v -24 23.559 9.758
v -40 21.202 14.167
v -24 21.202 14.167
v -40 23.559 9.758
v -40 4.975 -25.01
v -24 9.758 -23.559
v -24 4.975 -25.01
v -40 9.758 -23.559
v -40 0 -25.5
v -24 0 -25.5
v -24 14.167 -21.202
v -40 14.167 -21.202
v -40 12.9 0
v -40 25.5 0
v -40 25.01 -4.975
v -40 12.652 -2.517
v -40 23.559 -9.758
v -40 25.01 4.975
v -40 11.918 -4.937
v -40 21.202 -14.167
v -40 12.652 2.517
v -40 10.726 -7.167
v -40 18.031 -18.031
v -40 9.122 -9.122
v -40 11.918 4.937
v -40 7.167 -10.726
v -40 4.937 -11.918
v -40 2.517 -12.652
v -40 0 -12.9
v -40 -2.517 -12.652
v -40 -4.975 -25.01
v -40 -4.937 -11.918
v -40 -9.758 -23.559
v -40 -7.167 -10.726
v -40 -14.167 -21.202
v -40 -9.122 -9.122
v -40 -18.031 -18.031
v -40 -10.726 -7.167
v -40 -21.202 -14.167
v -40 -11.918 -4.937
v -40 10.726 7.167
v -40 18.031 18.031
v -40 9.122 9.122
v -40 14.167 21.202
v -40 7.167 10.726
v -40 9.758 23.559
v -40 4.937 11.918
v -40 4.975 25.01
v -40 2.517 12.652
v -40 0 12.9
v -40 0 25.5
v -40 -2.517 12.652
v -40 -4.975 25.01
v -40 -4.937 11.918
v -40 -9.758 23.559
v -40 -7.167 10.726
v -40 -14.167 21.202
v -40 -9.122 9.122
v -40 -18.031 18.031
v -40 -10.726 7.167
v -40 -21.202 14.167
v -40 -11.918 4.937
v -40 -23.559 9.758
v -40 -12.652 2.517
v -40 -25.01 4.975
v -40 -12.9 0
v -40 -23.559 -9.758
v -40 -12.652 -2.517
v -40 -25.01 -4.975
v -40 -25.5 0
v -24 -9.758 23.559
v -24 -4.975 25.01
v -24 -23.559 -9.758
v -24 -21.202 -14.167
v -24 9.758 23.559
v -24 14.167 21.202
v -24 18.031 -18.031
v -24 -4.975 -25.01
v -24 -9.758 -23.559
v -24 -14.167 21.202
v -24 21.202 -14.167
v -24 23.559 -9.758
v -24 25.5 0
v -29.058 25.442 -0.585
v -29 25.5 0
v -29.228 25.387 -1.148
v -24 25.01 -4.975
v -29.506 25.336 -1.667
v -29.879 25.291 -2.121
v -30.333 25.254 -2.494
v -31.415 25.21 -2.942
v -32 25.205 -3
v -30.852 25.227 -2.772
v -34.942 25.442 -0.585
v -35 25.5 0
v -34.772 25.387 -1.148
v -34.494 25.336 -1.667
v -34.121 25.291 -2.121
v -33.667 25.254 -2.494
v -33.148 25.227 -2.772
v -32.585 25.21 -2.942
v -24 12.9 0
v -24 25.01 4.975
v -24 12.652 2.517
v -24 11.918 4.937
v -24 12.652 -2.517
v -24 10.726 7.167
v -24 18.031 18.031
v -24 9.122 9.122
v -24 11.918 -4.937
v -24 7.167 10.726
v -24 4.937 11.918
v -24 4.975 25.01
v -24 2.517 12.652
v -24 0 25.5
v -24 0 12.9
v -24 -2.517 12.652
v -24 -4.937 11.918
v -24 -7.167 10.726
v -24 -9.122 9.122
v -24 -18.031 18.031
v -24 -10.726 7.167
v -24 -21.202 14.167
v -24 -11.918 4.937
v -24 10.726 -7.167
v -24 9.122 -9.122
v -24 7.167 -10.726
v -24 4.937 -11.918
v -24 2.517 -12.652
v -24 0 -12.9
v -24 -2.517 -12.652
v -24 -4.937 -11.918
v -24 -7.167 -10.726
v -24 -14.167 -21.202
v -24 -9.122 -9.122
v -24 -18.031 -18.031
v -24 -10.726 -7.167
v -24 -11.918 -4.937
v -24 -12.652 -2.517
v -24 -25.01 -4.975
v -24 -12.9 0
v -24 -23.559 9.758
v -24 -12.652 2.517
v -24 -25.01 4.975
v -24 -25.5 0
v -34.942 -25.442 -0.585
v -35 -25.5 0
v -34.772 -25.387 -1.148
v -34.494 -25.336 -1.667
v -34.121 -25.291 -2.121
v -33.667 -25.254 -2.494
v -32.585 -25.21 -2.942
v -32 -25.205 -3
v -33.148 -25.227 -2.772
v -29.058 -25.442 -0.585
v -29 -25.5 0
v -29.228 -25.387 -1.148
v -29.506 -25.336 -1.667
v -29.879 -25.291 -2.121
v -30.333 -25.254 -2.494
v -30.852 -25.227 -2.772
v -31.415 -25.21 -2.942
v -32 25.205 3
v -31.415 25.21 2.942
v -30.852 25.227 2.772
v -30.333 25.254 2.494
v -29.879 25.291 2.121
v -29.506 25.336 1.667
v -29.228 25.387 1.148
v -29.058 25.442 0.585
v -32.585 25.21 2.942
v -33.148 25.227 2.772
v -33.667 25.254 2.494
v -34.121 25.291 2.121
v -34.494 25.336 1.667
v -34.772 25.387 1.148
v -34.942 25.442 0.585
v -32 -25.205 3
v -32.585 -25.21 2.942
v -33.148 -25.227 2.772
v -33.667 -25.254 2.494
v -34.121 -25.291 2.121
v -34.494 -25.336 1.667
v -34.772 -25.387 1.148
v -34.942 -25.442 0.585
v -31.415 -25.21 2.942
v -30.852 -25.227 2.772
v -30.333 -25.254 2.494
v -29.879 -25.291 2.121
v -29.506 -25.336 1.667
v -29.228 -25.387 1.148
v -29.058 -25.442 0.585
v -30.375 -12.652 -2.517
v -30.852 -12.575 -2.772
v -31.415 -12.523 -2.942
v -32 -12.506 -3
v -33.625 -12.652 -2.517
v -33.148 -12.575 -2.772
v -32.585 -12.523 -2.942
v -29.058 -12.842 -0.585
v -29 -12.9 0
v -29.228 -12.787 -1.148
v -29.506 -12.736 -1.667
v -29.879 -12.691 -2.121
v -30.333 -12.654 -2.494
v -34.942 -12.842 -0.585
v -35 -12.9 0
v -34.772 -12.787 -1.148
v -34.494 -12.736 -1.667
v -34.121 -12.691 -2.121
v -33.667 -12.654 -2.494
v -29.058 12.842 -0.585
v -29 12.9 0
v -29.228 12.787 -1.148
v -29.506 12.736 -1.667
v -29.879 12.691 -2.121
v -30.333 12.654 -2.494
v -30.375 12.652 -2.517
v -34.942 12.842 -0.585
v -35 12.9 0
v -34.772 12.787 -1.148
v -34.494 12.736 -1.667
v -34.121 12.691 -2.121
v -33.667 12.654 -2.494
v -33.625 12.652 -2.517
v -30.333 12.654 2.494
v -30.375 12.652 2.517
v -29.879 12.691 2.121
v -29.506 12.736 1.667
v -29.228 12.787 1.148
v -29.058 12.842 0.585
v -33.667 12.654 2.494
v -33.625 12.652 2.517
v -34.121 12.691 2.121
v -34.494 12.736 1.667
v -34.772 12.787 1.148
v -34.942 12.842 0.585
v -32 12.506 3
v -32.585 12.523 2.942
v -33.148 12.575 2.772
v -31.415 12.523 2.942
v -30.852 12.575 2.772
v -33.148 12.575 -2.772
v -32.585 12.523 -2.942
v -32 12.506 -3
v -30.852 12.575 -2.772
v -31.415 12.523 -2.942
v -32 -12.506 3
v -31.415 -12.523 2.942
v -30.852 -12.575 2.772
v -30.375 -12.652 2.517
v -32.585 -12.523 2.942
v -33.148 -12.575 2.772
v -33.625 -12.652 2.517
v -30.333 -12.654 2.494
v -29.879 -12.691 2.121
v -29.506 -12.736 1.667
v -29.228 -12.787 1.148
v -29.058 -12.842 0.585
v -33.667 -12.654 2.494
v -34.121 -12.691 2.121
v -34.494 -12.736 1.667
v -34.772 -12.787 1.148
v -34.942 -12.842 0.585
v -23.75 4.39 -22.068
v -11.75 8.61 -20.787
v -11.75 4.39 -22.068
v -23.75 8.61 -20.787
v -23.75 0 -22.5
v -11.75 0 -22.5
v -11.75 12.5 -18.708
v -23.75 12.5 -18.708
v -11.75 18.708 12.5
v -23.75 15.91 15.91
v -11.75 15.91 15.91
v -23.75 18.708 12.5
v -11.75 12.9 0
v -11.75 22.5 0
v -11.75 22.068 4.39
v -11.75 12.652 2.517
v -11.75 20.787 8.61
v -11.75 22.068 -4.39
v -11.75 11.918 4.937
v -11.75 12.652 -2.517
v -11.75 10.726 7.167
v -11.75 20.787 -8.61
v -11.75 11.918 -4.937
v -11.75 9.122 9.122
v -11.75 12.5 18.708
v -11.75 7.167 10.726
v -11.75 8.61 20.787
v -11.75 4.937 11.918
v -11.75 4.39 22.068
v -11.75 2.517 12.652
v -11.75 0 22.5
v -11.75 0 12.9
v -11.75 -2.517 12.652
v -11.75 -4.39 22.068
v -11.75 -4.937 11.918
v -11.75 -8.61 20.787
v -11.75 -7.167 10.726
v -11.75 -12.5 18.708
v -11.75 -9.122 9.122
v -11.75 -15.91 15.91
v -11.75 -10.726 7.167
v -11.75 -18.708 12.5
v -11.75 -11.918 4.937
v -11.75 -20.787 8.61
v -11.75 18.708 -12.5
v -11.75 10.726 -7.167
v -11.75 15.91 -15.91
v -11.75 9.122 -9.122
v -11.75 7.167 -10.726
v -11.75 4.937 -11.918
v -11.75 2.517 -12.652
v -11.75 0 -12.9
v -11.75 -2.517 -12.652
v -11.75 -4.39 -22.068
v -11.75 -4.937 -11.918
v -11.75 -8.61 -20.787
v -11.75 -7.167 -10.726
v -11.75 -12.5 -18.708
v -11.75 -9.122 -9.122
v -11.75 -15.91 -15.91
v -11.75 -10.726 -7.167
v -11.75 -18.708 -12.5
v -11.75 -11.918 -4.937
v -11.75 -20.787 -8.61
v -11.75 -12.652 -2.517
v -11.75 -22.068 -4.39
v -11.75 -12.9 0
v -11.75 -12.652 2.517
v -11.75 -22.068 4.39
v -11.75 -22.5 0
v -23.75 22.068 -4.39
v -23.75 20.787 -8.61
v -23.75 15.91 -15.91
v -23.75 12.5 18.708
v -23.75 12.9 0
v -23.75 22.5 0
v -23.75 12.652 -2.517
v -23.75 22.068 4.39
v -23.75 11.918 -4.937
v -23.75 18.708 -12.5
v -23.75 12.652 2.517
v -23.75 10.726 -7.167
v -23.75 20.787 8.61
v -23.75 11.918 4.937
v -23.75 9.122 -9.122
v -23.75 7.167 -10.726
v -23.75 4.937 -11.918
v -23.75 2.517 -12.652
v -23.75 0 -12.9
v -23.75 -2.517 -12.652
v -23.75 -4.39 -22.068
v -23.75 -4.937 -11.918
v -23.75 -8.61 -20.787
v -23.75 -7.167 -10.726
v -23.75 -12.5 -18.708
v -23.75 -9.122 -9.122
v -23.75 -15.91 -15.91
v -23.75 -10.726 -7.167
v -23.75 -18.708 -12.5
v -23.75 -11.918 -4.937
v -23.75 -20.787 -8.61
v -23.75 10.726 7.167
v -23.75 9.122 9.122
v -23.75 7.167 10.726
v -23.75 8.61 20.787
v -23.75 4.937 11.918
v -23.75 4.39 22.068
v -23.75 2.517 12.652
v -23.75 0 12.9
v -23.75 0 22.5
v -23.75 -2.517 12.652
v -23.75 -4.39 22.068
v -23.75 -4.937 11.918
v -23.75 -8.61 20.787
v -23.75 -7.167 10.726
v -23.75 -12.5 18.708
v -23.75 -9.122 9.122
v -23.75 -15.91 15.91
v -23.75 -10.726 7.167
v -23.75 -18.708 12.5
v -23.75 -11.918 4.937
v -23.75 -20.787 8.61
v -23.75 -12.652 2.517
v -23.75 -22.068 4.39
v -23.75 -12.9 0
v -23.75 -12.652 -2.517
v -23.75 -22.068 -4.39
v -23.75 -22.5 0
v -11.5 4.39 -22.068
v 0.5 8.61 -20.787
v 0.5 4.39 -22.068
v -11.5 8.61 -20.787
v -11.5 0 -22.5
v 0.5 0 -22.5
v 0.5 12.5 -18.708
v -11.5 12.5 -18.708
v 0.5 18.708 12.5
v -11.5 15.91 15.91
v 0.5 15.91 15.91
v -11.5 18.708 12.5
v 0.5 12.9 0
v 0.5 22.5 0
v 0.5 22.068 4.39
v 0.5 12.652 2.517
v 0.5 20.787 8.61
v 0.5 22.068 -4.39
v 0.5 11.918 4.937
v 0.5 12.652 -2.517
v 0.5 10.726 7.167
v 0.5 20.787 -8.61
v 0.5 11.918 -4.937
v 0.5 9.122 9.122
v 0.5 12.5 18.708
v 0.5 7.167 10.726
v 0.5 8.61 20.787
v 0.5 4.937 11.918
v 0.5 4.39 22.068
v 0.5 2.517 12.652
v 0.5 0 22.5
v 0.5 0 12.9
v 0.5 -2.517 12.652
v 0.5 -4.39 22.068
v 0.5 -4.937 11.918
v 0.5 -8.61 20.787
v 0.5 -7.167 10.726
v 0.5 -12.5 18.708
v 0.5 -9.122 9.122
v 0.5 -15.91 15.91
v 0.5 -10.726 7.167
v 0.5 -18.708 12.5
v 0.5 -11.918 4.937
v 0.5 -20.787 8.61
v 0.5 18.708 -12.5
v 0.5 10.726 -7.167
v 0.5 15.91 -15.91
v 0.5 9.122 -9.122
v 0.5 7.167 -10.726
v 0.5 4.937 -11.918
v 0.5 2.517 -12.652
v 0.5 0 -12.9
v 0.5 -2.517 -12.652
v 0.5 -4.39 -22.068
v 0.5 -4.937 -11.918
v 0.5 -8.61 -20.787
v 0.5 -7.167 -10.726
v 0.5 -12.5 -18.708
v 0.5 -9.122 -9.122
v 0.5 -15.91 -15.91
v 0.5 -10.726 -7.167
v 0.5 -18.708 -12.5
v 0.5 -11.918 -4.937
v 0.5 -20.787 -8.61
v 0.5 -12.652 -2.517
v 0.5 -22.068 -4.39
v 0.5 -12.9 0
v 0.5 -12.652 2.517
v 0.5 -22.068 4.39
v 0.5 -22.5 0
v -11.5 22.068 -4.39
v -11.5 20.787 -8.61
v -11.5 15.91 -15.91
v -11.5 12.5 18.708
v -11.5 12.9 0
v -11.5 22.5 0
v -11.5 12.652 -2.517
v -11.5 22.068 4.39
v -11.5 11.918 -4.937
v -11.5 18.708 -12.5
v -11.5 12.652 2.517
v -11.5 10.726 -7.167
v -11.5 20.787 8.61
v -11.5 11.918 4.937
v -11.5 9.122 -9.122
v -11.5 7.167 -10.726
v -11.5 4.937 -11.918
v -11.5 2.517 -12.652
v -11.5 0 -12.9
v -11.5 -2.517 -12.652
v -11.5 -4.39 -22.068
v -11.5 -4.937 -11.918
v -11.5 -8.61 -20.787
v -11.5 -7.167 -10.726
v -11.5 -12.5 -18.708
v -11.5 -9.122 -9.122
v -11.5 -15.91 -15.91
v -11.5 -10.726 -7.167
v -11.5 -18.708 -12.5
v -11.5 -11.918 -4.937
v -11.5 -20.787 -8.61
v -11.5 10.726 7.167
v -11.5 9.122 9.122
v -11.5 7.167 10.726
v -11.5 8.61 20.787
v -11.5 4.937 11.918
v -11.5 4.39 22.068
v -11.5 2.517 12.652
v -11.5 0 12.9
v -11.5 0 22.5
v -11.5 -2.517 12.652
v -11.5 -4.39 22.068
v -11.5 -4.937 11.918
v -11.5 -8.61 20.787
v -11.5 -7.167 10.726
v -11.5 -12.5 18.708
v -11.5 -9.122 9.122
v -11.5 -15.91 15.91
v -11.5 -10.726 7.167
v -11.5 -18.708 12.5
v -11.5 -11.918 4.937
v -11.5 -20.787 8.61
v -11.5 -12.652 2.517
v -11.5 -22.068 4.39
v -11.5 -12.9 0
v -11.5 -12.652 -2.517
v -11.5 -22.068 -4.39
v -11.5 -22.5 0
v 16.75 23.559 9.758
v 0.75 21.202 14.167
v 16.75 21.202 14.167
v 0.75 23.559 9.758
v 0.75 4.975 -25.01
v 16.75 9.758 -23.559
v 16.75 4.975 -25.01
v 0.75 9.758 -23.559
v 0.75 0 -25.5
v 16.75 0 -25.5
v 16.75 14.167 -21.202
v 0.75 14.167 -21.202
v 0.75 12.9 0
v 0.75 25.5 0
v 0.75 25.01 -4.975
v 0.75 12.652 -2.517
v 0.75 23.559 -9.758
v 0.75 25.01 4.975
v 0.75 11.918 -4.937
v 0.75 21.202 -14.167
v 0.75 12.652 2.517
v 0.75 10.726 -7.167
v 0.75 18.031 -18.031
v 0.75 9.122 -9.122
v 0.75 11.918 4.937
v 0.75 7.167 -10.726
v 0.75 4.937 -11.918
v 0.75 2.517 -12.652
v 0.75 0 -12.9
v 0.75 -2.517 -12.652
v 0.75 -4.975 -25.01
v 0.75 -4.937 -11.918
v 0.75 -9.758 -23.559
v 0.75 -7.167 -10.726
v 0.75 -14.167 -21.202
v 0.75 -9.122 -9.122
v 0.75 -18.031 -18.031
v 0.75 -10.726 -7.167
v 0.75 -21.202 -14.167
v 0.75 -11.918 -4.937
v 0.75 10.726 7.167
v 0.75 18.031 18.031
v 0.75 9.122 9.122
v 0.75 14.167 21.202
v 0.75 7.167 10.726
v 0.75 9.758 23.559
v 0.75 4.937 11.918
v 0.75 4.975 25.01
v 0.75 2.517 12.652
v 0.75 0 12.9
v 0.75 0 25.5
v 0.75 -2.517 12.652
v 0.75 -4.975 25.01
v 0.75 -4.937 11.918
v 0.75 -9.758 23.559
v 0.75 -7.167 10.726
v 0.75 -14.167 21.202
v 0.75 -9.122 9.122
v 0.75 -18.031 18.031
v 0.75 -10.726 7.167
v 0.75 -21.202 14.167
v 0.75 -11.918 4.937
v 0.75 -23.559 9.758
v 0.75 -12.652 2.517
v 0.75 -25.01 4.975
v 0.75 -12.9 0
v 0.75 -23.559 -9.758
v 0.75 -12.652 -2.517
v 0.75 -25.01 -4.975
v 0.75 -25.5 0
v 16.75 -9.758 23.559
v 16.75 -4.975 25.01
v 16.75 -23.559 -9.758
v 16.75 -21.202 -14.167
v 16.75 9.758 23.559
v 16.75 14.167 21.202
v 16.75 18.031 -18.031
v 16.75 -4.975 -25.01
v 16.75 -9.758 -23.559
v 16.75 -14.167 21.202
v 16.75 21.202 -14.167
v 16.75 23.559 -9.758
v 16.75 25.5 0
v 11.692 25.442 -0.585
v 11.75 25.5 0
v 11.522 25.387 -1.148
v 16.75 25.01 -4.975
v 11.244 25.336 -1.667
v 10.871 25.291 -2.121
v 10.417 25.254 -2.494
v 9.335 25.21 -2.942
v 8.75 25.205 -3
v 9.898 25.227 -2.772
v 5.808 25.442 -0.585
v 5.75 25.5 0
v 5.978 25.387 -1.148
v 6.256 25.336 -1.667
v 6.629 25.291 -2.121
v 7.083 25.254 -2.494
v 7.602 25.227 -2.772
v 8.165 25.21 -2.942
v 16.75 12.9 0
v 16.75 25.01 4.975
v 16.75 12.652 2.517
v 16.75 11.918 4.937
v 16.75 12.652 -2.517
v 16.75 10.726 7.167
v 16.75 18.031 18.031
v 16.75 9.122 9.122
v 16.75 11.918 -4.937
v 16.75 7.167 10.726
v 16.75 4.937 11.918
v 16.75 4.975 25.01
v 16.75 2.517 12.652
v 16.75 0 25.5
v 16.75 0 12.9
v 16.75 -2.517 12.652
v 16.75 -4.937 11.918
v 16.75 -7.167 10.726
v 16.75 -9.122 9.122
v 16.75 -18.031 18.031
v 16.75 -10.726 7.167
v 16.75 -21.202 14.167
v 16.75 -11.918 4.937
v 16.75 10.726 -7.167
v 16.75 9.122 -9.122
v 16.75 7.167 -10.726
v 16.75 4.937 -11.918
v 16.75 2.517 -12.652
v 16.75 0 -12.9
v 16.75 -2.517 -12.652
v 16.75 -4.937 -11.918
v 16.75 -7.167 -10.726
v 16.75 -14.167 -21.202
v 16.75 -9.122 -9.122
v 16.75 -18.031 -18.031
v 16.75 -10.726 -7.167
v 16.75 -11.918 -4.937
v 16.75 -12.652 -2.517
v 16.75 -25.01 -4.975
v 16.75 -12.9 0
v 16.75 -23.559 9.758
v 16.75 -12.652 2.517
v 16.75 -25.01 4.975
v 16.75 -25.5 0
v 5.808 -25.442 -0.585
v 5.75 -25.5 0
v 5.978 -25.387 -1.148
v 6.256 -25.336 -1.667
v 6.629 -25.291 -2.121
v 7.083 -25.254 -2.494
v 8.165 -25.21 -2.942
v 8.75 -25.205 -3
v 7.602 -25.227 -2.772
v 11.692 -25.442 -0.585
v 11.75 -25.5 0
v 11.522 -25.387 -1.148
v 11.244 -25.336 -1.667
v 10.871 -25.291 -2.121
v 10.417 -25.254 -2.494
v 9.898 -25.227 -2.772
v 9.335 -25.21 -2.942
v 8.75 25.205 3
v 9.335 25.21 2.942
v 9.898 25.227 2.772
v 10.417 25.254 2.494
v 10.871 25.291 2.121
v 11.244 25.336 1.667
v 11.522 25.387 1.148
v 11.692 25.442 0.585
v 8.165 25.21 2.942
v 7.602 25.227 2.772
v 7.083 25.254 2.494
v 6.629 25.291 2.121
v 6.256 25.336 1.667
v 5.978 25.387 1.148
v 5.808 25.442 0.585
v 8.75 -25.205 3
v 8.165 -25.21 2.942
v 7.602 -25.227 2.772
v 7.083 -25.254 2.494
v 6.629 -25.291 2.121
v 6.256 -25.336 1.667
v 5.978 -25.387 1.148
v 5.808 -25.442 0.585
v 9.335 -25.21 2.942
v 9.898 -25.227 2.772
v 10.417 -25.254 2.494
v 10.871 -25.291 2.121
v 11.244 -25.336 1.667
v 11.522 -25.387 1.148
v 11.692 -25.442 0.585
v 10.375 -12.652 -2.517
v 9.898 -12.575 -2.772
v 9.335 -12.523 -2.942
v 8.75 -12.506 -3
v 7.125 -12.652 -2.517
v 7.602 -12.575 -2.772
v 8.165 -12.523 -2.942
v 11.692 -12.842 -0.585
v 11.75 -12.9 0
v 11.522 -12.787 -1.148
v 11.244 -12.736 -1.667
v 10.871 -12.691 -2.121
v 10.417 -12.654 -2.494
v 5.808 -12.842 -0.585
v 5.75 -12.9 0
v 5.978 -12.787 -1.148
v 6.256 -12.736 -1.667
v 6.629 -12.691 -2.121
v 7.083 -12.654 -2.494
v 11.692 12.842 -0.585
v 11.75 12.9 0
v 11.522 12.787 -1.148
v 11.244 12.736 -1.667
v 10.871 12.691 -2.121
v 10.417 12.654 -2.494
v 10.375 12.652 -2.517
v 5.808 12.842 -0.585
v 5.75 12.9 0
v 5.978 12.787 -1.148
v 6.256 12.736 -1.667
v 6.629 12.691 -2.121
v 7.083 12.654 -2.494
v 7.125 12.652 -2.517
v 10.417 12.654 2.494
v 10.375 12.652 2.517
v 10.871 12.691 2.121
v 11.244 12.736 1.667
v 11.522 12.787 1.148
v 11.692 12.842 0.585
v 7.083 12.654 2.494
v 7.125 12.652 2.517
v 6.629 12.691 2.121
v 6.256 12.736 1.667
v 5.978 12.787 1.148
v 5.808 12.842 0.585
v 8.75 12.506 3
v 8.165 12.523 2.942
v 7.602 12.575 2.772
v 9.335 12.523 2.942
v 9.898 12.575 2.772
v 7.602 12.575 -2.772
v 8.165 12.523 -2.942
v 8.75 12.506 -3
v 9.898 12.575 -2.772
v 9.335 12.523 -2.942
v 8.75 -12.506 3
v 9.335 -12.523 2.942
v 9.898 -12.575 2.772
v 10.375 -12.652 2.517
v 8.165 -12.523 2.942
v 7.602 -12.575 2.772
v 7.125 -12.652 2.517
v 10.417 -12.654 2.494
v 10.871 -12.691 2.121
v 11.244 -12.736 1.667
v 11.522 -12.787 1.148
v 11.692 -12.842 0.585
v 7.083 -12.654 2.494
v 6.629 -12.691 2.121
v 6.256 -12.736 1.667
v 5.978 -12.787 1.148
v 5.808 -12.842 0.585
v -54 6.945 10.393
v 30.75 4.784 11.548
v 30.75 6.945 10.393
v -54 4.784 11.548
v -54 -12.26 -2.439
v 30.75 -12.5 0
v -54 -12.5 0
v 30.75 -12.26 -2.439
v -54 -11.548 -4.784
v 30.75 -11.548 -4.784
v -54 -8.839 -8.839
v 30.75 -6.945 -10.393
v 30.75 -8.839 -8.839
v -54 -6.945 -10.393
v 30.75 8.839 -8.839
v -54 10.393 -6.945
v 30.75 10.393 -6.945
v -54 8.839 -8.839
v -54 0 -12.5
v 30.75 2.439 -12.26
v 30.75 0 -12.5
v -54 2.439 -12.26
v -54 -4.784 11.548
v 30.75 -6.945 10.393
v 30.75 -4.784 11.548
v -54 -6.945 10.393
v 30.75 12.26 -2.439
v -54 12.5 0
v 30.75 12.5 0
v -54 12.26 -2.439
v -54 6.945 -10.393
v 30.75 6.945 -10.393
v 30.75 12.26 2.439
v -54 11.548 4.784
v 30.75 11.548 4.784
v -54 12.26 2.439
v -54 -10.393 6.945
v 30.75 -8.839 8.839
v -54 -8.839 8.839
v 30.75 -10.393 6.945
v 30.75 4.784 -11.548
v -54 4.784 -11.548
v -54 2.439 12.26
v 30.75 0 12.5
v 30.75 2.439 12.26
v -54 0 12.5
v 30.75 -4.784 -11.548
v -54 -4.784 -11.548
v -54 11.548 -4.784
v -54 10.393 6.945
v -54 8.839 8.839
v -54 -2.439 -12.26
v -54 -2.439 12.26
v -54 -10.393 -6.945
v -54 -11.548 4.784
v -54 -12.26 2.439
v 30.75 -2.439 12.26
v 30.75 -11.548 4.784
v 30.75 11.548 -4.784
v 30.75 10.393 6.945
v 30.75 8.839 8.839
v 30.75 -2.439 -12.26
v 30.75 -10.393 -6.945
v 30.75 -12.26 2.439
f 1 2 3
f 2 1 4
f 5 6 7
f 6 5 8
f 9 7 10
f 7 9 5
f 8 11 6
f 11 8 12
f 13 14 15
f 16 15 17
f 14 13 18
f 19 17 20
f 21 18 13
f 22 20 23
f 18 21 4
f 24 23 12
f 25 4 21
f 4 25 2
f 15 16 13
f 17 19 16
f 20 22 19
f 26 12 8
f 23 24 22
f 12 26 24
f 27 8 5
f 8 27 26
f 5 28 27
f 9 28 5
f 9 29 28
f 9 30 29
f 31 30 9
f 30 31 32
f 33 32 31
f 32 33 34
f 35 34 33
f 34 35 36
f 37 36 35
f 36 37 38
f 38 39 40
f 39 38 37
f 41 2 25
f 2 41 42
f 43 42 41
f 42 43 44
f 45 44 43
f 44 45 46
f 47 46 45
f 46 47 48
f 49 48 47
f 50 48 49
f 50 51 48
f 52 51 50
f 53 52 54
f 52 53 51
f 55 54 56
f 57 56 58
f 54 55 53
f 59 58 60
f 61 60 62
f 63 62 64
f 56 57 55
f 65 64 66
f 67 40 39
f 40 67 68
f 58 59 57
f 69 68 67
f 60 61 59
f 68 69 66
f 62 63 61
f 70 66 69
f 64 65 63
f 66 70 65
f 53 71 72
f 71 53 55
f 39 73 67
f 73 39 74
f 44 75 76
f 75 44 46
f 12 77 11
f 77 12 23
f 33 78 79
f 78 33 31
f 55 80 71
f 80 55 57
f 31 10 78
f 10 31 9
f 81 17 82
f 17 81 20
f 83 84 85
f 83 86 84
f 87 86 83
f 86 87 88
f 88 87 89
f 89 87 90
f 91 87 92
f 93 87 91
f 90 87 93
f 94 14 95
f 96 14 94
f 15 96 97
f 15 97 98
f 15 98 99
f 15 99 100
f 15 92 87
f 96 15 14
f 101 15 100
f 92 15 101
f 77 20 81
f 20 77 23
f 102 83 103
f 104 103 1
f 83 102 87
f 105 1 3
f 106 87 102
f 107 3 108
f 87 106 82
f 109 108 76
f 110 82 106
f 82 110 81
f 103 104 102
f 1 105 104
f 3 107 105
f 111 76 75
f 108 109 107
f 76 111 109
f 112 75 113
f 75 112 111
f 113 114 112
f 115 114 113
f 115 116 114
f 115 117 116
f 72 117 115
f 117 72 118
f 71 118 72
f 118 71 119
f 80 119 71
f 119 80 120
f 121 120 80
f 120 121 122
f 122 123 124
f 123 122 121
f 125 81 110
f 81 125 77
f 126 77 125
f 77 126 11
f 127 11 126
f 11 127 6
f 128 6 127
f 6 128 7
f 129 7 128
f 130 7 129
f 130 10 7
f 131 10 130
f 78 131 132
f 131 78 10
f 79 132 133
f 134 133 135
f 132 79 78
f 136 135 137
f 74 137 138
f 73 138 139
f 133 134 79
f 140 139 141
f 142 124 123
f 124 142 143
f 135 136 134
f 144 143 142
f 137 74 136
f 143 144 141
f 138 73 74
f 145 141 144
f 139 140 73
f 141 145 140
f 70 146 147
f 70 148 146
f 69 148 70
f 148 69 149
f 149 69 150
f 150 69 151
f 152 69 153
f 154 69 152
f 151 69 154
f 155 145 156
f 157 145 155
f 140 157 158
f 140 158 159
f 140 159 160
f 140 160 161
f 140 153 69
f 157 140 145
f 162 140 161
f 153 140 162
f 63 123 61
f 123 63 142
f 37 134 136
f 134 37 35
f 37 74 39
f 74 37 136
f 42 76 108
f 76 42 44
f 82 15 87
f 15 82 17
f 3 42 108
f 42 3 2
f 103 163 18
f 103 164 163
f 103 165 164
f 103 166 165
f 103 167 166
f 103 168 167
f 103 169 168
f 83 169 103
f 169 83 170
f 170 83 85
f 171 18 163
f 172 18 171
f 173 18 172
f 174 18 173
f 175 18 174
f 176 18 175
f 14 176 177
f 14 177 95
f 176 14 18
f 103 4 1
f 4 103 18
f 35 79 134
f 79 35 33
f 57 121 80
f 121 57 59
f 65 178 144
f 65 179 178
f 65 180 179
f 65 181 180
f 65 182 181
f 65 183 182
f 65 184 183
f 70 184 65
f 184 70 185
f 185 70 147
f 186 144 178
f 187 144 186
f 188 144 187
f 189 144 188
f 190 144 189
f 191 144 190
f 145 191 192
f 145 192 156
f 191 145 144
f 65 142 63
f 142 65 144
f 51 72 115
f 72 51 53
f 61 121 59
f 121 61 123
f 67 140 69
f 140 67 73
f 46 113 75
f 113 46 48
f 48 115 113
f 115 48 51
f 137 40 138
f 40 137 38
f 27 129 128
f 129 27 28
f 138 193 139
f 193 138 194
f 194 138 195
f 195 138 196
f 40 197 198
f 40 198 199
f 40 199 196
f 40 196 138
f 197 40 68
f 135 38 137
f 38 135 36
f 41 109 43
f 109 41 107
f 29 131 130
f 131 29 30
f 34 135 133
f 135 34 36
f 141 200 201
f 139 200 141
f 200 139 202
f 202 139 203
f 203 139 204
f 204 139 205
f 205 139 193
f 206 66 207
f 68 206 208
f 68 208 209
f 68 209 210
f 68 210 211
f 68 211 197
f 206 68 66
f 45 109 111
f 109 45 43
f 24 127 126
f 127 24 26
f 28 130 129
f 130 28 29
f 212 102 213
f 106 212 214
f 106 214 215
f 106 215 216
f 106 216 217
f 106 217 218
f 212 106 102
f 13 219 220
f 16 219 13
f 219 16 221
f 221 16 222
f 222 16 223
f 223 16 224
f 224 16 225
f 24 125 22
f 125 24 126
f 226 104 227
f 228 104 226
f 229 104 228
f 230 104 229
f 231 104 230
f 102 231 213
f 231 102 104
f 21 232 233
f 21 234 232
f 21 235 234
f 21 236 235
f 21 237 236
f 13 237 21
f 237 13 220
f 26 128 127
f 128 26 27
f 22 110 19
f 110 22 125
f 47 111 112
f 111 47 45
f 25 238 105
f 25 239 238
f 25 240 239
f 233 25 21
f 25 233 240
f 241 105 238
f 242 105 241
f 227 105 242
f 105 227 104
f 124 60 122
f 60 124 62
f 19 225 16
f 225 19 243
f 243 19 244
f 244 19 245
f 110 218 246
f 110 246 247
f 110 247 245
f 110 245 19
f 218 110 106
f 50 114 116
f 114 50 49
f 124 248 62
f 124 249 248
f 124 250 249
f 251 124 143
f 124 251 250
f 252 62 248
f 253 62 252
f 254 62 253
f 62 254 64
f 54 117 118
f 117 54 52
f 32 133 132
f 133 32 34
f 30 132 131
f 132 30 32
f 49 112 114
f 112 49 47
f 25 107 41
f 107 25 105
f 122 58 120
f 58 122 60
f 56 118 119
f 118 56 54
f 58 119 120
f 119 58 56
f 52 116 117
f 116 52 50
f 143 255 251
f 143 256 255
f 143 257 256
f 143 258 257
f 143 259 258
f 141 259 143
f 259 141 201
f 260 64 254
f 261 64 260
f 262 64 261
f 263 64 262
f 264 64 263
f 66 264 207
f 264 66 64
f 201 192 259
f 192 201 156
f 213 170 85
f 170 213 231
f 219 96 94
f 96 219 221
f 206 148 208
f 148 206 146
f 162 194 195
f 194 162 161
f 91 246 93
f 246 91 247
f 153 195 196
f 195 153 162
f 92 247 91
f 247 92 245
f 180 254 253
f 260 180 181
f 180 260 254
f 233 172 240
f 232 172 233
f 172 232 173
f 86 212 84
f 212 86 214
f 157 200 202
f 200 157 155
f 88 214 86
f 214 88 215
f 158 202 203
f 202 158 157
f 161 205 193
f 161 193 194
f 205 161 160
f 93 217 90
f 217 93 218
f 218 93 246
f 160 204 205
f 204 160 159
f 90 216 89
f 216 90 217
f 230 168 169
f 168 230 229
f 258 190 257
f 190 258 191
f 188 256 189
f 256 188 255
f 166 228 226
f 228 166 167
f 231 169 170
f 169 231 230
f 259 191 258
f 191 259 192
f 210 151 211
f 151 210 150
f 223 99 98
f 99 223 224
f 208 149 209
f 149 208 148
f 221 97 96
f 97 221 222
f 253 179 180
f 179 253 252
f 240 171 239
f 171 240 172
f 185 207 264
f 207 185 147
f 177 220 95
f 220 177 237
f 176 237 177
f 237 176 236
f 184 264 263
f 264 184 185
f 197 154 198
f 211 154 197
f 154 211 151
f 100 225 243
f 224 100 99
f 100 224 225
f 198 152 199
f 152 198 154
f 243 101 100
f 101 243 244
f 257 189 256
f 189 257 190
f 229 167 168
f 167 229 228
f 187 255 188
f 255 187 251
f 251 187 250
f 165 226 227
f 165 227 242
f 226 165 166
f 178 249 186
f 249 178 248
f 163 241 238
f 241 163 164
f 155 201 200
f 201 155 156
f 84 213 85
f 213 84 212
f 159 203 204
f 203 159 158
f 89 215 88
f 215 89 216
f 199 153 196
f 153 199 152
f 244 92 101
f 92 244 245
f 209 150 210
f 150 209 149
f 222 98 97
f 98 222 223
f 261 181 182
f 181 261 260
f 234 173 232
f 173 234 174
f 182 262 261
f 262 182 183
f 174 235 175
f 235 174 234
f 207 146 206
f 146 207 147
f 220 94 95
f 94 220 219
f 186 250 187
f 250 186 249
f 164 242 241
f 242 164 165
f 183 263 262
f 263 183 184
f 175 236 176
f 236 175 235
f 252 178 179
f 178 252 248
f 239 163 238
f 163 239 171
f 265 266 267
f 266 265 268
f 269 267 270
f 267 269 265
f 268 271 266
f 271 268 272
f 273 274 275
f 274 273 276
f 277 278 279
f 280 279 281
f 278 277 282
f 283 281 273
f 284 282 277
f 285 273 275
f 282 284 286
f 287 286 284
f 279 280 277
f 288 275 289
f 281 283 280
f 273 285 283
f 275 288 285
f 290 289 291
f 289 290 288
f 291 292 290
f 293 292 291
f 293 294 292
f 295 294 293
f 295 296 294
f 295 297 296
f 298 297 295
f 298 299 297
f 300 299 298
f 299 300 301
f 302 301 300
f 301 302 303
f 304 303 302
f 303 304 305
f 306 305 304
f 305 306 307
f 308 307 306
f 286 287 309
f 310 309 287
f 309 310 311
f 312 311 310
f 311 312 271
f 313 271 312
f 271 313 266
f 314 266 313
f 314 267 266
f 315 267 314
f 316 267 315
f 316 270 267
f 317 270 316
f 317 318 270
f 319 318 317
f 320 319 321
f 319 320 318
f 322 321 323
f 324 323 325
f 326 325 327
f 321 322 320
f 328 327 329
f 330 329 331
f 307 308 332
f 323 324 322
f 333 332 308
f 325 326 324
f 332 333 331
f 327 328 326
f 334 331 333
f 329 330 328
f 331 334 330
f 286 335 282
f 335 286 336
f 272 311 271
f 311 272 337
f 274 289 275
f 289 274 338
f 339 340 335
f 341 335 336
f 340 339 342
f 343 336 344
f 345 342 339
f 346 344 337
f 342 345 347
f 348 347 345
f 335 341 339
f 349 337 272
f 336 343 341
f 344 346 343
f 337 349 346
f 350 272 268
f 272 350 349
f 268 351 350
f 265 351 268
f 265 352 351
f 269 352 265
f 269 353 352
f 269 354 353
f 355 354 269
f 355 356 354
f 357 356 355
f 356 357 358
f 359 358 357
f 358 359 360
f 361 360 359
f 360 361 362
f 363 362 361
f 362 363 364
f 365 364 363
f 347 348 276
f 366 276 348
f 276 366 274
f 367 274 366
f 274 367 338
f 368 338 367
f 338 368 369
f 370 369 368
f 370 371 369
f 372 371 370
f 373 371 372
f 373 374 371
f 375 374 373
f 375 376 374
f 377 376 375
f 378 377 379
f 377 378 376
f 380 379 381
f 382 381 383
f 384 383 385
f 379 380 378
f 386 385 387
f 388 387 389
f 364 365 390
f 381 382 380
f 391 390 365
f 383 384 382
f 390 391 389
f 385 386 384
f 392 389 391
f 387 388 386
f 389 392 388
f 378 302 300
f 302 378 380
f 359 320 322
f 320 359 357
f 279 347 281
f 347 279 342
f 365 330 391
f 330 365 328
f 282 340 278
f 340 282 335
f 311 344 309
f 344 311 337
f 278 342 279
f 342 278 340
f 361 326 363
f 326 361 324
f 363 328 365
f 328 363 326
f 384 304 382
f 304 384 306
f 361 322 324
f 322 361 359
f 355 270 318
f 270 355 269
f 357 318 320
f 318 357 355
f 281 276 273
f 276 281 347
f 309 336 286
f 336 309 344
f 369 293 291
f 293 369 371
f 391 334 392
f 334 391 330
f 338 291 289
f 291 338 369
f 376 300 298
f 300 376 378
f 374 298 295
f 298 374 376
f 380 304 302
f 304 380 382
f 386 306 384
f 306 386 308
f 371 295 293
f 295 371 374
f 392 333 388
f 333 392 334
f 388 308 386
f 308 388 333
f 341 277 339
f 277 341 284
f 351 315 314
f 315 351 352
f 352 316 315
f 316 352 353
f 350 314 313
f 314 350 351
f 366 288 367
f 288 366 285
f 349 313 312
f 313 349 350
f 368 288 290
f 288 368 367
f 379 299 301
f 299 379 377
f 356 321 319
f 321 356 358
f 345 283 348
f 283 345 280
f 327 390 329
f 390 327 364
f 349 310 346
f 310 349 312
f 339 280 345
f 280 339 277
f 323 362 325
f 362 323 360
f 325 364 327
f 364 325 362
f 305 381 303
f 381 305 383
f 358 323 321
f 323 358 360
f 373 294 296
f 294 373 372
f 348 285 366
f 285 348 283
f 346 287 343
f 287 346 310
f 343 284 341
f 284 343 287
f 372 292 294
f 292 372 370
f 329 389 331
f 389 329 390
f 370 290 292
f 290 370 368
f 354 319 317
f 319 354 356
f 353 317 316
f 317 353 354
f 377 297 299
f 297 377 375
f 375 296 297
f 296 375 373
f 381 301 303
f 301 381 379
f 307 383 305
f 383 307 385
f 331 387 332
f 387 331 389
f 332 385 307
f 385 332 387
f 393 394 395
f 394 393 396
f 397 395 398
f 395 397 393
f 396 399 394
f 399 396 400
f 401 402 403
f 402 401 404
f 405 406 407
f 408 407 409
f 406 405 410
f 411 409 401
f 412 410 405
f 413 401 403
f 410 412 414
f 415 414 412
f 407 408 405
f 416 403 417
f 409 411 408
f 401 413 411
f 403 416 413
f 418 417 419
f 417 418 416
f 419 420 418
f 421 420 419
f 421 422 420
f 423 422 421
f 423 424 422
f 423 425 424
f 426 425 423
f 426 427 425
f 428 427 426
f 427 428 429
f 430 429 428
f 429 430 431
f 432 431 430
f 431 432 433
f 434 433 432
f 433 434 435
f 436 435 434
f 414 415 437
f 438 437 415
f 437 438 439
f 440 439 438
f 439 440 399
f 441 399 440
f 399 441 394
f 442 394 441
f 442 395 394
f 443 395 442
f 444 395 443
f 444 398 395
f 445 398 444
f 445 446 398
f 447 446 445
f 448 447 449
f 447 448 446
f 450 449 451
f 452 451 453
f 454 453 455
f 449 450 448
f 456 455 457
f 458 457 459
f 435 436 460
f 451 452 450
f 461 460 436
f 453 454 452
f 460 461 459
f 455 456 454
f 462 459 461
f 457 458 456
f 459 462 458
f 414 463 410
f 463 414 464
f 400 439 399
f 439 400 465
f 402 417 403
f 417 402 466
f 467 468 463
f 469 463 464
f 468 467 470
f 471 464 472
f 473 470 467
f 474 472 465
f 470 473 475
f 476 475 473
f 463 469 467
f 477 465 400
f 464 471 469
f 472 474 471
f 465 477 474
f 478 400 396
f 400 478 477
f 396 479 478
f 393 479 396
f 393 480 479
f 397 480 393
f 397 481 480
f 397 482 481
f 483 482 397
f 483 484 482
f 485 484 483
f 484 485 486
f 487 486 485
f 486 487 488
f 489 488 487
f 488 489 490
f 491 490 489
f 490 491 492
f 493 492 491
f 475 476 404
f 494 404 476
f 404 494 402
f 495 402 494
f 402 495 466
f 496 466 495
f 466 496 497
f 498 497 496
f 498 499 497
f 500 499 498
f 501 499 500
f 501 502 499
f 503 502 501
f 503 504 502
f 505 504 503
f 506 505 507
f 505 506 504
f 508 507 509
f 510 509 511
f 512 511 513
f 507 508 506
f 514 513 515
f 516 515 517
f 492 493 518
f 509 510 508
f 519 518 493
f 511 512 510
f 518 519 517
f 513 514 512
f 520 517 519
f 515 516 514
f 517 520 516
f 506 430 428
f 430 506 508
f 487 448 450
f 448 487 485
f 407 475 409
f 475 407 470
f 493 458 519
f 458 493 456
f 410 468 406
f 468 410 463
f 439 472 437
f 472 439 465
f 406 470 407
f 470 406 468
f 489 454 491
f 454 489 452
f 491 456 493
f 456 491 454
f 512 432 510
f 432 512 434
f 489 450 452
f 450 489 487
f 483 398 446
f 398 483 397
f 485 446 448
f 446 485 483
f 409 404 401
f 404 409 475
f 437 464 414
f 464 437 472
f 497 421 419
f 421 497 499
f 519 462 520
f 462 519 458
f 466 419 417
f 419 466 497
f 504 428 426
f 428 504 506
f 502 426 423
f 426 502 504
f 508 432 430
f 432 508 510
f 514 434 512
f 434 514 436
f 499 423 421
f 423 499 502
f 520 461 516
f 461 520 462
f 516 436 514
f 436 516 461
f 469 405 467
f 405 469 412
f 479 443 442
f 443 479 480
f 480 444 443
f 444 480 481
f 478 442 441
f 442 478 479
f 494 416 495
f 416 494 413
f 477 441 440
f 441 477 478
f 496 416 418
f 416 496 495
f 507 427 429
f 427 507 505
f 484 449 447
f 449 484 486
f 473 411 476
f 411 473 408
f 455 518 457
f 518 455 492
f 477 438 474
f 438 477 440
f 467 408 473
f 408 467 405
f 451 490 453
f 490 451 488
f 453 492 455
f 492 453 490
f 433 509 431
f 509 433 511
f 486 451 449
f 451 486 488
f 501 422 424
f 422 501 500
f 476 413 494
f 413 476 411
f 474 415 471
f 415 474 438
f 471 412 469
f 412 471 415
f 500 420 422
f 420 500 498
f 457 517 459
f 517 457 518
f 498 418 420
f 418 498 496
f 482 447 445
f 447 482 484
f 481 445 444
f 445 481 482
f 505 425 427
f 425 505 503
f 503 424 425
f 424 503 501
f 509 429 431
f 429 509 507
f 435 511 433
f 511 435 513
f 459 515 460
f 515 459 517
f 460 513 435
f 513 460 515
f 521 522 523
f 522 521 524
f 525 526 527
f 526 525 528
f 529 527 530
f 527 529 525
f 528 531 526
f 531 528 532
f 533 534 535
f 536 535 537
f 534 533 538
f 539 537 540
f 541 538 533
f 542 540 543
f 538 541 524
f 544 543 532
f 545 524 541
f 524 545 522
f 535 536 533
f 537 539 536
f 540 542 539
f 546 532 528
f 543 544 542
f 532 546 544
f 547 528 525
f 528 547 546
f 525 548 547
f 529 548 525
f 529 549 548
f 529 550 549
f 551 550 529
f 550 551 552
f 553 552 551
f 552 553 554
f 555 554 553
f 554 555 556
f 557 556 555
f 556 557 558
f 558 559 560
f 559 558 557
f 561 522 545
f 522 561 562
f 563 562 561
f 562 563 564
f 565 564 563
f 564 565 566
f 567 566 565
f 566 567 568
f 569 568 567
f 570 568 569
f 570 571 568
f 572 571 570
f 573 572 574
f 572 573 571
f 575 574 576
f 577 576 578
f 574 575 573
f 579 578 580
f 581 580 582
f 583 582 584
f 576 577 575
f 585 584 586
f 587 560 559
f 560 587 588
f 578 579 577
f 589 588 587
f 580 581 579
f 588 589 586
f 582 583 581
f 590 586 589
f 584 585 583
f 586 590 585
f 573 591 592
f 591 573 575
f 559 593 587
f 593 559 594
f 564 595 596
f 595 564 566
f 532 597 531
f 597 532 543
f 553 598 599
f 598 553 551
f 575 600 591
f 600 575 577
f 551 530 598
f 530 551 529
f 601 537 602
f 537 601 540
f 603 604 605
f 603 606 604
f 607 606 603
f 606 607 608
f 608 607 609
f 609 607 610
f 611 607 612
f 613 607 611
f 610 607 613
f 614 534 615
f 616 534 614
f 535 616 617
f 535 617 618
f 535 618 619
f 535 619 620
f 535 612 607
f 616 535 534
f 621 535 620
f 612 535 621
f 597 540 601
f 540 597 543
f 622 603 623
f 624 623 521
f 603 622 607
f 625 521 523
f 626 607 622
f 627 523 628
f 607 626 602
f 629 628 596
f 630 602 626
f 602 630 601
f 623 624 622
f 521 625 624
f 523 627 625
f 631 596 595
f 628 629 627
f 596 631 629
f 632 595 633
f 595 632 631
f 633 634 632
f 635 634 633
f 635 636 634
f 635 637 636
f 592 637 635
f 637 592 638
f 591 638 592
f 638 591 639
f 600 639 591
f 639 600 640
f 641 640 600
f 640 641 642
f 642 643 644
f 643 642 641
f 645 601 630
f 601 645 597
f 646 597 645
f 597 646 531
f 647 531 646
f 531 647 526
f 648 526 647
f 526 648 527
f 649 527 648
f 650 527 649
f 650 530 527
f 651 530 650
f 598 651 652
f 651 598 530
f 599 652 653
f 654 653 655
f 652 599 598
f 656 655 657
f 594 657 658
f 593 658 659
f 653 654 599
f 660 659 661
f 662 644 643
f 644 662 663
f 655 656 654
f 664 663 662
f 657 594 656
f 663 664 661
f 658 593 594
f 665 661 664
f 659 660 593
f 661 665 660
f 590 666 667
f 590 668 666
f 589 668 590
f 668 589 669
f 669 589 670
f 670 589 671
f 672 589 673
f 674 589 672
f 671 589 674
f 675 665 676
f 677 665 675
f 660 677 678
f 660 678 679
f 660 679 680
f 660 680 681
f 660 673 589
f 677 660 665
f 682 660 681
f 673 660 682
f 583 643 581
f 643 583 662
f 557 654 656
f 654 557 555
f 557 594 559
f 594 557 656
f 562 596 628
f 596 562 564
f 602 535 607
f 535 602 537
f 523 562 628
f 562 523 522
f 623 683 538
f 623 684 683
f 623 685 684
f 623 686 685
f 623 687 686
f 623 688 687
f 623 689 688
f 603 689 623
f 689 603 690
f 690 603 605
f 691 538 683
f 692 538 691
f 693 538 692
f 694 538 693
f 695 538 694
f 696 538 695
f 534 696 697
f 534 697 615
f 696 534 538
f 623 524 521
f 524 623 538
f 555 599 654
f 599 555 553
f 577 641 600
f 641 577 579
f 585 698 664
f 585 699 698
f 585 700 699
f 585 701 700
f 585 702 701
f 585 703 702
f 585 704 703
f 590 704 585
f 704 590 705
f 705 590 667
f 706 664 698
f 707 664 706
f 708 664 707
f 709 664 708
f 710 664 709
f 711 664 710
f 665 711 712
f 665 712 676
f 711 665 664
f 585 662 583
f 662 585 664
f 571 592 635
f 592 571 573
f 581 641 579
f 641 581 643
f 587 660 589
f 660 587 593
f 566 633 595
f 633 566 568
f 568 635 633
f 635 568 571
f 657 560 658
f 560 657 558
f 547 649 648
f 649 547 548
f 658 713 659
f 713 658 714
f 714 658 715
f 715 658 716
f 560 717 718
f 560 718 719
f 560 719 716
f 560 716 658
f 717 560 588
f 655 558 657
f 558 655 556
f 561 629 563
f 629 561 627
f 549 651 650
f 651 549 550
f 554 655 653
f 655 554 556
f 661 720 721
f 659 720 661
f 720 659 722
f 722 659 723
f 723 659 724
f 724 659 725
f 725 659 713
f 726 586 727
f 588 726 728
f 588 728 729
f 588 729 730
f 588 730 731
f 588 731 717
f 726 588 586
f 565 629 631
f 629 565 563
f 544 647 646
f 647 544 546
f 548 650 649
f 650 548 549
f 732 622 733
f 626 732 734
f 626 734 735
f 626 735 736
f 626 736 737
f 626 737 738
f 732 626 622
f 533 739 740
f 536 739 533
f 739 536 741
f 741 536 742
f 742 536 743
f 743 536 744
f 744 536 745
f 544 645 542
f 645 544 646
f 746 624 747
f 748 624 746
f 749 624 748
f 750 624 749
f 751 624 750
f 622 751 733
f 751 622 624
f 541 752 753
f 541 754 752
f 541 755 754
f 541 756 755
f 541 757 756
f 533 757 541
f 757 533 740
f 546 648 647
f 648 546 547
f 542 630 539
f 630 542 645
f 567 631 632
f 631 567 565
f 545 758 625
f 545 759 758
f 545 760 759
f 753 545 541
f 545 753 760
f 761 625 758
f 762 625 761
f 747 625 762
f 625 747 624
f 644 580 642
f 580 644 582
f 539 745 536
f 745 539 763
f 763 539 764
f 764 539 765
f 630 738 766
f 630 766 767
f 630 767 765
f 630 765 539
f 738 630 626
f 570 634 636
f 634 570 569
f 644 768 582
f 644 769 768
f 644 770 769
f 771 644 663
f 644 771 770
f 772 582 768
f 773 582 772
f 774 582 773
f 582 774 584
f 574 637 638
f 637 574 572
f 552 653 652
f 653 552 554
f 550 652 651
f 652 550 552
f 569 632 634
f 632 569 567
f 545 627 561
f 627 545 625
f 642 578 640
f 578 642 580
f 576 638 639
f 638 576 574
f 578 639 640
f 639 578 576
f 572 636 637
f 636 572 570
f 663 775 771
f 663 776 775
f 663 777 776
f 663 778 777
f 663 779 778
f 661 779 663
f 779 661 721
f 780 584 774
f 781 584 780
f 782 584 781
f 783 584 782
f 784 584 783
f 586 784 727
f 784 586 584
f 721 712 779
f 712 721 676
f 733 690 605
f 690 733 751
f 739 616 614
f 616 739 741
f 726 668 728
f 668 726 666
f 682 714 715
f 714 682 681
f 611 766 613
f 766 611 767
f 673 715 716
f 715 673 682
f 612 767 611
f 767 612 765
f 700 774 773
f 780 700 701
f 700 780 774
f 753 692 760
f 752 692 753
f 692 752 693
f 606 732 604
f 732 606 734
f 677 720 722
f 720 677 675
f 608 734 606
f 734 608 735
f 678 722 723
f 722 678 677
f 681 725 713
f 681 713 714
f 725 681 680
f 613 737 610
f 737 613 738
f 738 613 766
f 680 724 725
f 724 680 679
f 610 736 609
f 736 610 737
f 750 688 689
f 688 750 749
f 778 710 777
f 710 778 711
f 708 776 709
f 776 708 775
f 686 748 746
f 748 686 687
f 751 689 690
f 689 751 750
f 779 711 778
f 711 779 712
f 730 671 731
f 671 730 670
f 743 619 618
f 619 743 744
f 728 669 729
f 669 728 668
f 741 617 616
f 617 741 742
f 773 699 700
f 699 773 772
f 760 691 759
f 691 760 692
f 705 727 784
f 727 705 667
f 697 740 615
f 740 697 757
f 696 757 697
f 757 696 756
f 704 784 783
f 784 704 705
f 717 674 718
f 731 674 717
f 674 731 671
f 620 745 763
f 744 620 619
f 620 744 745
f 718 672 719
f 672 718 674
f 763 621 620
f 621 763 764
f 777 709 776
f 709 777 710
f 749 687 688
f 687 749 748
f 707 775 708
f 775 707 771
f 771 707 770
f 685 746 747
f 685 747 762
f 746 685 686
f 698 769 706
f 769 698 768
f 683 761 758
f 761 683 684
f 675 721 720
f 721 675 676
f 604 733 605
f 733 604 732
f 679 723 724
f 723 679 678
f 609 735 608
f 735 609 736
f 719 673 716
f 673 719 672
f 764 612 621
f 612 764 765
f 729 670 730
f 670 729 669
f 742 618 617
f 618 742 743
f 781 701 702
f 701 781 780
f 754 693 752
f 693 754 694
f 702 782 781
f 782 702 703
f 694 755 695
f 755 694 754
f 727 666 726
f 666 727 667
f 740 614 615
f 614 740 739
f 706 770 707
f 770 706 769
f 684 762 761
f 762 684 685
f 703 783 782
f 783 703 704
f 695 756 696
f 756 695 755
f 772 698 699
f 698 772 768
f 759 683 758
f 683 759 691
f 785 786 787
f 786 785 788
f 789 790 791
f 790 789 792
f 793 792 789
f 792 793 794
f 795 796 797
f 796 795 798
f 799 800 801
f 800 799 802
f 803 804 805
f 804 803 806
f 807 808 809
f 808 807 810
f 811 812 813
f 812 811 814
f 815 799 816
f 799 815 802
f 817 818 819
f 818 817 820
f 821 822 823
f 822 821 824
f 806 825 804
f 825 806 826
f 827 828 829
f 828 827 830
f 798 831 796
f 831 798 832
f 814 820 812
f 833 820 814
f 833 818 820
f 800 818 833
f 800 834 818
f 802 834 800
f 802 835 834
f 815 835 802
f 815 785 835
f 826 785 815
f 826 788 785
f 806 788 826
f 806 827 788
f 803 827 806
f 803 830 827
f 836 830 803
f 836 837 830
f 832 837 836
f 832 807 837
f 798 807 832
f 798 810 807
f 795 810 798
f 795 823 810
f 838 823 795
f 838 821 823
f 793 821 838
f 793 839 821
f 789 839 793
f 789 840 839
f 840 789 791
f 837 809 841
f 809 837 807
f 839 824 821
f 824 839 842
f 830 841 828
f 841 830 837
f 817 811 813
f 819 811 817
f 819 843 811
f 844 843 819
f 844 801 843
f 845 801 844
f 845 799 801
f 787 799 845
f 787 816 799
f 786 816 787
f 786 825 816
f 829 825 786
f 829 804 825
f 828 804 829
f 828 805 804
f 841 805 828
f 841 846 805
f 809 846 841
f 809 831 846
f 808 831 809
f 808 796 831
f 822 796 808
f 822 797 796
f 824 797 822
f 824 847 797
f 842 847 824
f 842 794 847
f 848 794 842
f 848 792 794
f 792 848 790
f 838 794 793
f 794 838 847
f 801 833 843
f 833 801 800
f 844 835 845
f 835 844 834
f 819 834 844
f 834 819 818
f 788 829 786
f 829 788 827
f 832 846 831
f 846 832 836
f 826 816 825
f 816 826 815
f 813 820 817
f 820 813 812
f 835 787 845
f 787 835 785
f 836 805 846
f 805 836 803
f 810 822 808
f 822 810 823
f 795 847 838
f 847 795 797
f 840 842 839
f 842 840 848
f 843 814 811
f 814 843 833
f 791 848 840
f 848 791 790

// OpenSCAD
$fn = 32;

// ------------------------------------------------------------------------
// Shaft with rings and collars: d25 shaft, 4 rings
// Every part is its own module, assembly() places them once.
// ------------------------------------------------------------------------

// --- part 1 ---
module shaft() {
  translate([0, 0, -42.375]) cylinder(h = 84.75, d = 25);
}

// --- part 2 ---
module collar_a() {
  difference() {
    cylinder(h = 16, d = 51);
    translate([0, 0, -1]) cylinder(h = 18, d = 25.8);
    translate([0, 0, 8]) rotate([90, 0, 0]) cylinder(h = 53, d = 6, center = true);
  }
}

// --- part 3 ---
module spacer_a() {
  difference() {
      translate([0, 0, 0]) cylinder(h = 12, d = 45);
      translate([0, 0, -1]) cylinder(h = 14, d = 25.8);
    }
}

// --- part 4 ---
module spacer_b() {
  difference() {
      translate([0, 0, 0]) cylinder(h = 12, d = 45);
      translate([0, 0, -1]) cylinder(h = 14, d = 25.8);
    }
}

// --- part 5 ---
module collar_b() {
  difference() {
    cylinder(h = 16, d = 51);
    translate([0, 0, -1]) cylinder(h = 18, d = 25.8);
    translate([0, 0, 8]) rotate([90, 0, 0]) cylinder(h = 53, d = 6, center = true);
  }
}

// --- assembly ---
module assembly() {
  translate([-11.625, 0, 0]) rotate([0, 90, 0]) shaft();
  translate([-40, 0, 0]) rotate([0, 90, 0]) collar_a();
  translate([-23.75, 0, 0]) rotate([0, 90, 0]) spacer_a();
  translate([-11.5, 0, 0]) rotate([0, 90, 0]) spacer_b();
  translate([0.75, 0, 0]) rotate([0, 90, 0]) collar_b();
}

assembly();
